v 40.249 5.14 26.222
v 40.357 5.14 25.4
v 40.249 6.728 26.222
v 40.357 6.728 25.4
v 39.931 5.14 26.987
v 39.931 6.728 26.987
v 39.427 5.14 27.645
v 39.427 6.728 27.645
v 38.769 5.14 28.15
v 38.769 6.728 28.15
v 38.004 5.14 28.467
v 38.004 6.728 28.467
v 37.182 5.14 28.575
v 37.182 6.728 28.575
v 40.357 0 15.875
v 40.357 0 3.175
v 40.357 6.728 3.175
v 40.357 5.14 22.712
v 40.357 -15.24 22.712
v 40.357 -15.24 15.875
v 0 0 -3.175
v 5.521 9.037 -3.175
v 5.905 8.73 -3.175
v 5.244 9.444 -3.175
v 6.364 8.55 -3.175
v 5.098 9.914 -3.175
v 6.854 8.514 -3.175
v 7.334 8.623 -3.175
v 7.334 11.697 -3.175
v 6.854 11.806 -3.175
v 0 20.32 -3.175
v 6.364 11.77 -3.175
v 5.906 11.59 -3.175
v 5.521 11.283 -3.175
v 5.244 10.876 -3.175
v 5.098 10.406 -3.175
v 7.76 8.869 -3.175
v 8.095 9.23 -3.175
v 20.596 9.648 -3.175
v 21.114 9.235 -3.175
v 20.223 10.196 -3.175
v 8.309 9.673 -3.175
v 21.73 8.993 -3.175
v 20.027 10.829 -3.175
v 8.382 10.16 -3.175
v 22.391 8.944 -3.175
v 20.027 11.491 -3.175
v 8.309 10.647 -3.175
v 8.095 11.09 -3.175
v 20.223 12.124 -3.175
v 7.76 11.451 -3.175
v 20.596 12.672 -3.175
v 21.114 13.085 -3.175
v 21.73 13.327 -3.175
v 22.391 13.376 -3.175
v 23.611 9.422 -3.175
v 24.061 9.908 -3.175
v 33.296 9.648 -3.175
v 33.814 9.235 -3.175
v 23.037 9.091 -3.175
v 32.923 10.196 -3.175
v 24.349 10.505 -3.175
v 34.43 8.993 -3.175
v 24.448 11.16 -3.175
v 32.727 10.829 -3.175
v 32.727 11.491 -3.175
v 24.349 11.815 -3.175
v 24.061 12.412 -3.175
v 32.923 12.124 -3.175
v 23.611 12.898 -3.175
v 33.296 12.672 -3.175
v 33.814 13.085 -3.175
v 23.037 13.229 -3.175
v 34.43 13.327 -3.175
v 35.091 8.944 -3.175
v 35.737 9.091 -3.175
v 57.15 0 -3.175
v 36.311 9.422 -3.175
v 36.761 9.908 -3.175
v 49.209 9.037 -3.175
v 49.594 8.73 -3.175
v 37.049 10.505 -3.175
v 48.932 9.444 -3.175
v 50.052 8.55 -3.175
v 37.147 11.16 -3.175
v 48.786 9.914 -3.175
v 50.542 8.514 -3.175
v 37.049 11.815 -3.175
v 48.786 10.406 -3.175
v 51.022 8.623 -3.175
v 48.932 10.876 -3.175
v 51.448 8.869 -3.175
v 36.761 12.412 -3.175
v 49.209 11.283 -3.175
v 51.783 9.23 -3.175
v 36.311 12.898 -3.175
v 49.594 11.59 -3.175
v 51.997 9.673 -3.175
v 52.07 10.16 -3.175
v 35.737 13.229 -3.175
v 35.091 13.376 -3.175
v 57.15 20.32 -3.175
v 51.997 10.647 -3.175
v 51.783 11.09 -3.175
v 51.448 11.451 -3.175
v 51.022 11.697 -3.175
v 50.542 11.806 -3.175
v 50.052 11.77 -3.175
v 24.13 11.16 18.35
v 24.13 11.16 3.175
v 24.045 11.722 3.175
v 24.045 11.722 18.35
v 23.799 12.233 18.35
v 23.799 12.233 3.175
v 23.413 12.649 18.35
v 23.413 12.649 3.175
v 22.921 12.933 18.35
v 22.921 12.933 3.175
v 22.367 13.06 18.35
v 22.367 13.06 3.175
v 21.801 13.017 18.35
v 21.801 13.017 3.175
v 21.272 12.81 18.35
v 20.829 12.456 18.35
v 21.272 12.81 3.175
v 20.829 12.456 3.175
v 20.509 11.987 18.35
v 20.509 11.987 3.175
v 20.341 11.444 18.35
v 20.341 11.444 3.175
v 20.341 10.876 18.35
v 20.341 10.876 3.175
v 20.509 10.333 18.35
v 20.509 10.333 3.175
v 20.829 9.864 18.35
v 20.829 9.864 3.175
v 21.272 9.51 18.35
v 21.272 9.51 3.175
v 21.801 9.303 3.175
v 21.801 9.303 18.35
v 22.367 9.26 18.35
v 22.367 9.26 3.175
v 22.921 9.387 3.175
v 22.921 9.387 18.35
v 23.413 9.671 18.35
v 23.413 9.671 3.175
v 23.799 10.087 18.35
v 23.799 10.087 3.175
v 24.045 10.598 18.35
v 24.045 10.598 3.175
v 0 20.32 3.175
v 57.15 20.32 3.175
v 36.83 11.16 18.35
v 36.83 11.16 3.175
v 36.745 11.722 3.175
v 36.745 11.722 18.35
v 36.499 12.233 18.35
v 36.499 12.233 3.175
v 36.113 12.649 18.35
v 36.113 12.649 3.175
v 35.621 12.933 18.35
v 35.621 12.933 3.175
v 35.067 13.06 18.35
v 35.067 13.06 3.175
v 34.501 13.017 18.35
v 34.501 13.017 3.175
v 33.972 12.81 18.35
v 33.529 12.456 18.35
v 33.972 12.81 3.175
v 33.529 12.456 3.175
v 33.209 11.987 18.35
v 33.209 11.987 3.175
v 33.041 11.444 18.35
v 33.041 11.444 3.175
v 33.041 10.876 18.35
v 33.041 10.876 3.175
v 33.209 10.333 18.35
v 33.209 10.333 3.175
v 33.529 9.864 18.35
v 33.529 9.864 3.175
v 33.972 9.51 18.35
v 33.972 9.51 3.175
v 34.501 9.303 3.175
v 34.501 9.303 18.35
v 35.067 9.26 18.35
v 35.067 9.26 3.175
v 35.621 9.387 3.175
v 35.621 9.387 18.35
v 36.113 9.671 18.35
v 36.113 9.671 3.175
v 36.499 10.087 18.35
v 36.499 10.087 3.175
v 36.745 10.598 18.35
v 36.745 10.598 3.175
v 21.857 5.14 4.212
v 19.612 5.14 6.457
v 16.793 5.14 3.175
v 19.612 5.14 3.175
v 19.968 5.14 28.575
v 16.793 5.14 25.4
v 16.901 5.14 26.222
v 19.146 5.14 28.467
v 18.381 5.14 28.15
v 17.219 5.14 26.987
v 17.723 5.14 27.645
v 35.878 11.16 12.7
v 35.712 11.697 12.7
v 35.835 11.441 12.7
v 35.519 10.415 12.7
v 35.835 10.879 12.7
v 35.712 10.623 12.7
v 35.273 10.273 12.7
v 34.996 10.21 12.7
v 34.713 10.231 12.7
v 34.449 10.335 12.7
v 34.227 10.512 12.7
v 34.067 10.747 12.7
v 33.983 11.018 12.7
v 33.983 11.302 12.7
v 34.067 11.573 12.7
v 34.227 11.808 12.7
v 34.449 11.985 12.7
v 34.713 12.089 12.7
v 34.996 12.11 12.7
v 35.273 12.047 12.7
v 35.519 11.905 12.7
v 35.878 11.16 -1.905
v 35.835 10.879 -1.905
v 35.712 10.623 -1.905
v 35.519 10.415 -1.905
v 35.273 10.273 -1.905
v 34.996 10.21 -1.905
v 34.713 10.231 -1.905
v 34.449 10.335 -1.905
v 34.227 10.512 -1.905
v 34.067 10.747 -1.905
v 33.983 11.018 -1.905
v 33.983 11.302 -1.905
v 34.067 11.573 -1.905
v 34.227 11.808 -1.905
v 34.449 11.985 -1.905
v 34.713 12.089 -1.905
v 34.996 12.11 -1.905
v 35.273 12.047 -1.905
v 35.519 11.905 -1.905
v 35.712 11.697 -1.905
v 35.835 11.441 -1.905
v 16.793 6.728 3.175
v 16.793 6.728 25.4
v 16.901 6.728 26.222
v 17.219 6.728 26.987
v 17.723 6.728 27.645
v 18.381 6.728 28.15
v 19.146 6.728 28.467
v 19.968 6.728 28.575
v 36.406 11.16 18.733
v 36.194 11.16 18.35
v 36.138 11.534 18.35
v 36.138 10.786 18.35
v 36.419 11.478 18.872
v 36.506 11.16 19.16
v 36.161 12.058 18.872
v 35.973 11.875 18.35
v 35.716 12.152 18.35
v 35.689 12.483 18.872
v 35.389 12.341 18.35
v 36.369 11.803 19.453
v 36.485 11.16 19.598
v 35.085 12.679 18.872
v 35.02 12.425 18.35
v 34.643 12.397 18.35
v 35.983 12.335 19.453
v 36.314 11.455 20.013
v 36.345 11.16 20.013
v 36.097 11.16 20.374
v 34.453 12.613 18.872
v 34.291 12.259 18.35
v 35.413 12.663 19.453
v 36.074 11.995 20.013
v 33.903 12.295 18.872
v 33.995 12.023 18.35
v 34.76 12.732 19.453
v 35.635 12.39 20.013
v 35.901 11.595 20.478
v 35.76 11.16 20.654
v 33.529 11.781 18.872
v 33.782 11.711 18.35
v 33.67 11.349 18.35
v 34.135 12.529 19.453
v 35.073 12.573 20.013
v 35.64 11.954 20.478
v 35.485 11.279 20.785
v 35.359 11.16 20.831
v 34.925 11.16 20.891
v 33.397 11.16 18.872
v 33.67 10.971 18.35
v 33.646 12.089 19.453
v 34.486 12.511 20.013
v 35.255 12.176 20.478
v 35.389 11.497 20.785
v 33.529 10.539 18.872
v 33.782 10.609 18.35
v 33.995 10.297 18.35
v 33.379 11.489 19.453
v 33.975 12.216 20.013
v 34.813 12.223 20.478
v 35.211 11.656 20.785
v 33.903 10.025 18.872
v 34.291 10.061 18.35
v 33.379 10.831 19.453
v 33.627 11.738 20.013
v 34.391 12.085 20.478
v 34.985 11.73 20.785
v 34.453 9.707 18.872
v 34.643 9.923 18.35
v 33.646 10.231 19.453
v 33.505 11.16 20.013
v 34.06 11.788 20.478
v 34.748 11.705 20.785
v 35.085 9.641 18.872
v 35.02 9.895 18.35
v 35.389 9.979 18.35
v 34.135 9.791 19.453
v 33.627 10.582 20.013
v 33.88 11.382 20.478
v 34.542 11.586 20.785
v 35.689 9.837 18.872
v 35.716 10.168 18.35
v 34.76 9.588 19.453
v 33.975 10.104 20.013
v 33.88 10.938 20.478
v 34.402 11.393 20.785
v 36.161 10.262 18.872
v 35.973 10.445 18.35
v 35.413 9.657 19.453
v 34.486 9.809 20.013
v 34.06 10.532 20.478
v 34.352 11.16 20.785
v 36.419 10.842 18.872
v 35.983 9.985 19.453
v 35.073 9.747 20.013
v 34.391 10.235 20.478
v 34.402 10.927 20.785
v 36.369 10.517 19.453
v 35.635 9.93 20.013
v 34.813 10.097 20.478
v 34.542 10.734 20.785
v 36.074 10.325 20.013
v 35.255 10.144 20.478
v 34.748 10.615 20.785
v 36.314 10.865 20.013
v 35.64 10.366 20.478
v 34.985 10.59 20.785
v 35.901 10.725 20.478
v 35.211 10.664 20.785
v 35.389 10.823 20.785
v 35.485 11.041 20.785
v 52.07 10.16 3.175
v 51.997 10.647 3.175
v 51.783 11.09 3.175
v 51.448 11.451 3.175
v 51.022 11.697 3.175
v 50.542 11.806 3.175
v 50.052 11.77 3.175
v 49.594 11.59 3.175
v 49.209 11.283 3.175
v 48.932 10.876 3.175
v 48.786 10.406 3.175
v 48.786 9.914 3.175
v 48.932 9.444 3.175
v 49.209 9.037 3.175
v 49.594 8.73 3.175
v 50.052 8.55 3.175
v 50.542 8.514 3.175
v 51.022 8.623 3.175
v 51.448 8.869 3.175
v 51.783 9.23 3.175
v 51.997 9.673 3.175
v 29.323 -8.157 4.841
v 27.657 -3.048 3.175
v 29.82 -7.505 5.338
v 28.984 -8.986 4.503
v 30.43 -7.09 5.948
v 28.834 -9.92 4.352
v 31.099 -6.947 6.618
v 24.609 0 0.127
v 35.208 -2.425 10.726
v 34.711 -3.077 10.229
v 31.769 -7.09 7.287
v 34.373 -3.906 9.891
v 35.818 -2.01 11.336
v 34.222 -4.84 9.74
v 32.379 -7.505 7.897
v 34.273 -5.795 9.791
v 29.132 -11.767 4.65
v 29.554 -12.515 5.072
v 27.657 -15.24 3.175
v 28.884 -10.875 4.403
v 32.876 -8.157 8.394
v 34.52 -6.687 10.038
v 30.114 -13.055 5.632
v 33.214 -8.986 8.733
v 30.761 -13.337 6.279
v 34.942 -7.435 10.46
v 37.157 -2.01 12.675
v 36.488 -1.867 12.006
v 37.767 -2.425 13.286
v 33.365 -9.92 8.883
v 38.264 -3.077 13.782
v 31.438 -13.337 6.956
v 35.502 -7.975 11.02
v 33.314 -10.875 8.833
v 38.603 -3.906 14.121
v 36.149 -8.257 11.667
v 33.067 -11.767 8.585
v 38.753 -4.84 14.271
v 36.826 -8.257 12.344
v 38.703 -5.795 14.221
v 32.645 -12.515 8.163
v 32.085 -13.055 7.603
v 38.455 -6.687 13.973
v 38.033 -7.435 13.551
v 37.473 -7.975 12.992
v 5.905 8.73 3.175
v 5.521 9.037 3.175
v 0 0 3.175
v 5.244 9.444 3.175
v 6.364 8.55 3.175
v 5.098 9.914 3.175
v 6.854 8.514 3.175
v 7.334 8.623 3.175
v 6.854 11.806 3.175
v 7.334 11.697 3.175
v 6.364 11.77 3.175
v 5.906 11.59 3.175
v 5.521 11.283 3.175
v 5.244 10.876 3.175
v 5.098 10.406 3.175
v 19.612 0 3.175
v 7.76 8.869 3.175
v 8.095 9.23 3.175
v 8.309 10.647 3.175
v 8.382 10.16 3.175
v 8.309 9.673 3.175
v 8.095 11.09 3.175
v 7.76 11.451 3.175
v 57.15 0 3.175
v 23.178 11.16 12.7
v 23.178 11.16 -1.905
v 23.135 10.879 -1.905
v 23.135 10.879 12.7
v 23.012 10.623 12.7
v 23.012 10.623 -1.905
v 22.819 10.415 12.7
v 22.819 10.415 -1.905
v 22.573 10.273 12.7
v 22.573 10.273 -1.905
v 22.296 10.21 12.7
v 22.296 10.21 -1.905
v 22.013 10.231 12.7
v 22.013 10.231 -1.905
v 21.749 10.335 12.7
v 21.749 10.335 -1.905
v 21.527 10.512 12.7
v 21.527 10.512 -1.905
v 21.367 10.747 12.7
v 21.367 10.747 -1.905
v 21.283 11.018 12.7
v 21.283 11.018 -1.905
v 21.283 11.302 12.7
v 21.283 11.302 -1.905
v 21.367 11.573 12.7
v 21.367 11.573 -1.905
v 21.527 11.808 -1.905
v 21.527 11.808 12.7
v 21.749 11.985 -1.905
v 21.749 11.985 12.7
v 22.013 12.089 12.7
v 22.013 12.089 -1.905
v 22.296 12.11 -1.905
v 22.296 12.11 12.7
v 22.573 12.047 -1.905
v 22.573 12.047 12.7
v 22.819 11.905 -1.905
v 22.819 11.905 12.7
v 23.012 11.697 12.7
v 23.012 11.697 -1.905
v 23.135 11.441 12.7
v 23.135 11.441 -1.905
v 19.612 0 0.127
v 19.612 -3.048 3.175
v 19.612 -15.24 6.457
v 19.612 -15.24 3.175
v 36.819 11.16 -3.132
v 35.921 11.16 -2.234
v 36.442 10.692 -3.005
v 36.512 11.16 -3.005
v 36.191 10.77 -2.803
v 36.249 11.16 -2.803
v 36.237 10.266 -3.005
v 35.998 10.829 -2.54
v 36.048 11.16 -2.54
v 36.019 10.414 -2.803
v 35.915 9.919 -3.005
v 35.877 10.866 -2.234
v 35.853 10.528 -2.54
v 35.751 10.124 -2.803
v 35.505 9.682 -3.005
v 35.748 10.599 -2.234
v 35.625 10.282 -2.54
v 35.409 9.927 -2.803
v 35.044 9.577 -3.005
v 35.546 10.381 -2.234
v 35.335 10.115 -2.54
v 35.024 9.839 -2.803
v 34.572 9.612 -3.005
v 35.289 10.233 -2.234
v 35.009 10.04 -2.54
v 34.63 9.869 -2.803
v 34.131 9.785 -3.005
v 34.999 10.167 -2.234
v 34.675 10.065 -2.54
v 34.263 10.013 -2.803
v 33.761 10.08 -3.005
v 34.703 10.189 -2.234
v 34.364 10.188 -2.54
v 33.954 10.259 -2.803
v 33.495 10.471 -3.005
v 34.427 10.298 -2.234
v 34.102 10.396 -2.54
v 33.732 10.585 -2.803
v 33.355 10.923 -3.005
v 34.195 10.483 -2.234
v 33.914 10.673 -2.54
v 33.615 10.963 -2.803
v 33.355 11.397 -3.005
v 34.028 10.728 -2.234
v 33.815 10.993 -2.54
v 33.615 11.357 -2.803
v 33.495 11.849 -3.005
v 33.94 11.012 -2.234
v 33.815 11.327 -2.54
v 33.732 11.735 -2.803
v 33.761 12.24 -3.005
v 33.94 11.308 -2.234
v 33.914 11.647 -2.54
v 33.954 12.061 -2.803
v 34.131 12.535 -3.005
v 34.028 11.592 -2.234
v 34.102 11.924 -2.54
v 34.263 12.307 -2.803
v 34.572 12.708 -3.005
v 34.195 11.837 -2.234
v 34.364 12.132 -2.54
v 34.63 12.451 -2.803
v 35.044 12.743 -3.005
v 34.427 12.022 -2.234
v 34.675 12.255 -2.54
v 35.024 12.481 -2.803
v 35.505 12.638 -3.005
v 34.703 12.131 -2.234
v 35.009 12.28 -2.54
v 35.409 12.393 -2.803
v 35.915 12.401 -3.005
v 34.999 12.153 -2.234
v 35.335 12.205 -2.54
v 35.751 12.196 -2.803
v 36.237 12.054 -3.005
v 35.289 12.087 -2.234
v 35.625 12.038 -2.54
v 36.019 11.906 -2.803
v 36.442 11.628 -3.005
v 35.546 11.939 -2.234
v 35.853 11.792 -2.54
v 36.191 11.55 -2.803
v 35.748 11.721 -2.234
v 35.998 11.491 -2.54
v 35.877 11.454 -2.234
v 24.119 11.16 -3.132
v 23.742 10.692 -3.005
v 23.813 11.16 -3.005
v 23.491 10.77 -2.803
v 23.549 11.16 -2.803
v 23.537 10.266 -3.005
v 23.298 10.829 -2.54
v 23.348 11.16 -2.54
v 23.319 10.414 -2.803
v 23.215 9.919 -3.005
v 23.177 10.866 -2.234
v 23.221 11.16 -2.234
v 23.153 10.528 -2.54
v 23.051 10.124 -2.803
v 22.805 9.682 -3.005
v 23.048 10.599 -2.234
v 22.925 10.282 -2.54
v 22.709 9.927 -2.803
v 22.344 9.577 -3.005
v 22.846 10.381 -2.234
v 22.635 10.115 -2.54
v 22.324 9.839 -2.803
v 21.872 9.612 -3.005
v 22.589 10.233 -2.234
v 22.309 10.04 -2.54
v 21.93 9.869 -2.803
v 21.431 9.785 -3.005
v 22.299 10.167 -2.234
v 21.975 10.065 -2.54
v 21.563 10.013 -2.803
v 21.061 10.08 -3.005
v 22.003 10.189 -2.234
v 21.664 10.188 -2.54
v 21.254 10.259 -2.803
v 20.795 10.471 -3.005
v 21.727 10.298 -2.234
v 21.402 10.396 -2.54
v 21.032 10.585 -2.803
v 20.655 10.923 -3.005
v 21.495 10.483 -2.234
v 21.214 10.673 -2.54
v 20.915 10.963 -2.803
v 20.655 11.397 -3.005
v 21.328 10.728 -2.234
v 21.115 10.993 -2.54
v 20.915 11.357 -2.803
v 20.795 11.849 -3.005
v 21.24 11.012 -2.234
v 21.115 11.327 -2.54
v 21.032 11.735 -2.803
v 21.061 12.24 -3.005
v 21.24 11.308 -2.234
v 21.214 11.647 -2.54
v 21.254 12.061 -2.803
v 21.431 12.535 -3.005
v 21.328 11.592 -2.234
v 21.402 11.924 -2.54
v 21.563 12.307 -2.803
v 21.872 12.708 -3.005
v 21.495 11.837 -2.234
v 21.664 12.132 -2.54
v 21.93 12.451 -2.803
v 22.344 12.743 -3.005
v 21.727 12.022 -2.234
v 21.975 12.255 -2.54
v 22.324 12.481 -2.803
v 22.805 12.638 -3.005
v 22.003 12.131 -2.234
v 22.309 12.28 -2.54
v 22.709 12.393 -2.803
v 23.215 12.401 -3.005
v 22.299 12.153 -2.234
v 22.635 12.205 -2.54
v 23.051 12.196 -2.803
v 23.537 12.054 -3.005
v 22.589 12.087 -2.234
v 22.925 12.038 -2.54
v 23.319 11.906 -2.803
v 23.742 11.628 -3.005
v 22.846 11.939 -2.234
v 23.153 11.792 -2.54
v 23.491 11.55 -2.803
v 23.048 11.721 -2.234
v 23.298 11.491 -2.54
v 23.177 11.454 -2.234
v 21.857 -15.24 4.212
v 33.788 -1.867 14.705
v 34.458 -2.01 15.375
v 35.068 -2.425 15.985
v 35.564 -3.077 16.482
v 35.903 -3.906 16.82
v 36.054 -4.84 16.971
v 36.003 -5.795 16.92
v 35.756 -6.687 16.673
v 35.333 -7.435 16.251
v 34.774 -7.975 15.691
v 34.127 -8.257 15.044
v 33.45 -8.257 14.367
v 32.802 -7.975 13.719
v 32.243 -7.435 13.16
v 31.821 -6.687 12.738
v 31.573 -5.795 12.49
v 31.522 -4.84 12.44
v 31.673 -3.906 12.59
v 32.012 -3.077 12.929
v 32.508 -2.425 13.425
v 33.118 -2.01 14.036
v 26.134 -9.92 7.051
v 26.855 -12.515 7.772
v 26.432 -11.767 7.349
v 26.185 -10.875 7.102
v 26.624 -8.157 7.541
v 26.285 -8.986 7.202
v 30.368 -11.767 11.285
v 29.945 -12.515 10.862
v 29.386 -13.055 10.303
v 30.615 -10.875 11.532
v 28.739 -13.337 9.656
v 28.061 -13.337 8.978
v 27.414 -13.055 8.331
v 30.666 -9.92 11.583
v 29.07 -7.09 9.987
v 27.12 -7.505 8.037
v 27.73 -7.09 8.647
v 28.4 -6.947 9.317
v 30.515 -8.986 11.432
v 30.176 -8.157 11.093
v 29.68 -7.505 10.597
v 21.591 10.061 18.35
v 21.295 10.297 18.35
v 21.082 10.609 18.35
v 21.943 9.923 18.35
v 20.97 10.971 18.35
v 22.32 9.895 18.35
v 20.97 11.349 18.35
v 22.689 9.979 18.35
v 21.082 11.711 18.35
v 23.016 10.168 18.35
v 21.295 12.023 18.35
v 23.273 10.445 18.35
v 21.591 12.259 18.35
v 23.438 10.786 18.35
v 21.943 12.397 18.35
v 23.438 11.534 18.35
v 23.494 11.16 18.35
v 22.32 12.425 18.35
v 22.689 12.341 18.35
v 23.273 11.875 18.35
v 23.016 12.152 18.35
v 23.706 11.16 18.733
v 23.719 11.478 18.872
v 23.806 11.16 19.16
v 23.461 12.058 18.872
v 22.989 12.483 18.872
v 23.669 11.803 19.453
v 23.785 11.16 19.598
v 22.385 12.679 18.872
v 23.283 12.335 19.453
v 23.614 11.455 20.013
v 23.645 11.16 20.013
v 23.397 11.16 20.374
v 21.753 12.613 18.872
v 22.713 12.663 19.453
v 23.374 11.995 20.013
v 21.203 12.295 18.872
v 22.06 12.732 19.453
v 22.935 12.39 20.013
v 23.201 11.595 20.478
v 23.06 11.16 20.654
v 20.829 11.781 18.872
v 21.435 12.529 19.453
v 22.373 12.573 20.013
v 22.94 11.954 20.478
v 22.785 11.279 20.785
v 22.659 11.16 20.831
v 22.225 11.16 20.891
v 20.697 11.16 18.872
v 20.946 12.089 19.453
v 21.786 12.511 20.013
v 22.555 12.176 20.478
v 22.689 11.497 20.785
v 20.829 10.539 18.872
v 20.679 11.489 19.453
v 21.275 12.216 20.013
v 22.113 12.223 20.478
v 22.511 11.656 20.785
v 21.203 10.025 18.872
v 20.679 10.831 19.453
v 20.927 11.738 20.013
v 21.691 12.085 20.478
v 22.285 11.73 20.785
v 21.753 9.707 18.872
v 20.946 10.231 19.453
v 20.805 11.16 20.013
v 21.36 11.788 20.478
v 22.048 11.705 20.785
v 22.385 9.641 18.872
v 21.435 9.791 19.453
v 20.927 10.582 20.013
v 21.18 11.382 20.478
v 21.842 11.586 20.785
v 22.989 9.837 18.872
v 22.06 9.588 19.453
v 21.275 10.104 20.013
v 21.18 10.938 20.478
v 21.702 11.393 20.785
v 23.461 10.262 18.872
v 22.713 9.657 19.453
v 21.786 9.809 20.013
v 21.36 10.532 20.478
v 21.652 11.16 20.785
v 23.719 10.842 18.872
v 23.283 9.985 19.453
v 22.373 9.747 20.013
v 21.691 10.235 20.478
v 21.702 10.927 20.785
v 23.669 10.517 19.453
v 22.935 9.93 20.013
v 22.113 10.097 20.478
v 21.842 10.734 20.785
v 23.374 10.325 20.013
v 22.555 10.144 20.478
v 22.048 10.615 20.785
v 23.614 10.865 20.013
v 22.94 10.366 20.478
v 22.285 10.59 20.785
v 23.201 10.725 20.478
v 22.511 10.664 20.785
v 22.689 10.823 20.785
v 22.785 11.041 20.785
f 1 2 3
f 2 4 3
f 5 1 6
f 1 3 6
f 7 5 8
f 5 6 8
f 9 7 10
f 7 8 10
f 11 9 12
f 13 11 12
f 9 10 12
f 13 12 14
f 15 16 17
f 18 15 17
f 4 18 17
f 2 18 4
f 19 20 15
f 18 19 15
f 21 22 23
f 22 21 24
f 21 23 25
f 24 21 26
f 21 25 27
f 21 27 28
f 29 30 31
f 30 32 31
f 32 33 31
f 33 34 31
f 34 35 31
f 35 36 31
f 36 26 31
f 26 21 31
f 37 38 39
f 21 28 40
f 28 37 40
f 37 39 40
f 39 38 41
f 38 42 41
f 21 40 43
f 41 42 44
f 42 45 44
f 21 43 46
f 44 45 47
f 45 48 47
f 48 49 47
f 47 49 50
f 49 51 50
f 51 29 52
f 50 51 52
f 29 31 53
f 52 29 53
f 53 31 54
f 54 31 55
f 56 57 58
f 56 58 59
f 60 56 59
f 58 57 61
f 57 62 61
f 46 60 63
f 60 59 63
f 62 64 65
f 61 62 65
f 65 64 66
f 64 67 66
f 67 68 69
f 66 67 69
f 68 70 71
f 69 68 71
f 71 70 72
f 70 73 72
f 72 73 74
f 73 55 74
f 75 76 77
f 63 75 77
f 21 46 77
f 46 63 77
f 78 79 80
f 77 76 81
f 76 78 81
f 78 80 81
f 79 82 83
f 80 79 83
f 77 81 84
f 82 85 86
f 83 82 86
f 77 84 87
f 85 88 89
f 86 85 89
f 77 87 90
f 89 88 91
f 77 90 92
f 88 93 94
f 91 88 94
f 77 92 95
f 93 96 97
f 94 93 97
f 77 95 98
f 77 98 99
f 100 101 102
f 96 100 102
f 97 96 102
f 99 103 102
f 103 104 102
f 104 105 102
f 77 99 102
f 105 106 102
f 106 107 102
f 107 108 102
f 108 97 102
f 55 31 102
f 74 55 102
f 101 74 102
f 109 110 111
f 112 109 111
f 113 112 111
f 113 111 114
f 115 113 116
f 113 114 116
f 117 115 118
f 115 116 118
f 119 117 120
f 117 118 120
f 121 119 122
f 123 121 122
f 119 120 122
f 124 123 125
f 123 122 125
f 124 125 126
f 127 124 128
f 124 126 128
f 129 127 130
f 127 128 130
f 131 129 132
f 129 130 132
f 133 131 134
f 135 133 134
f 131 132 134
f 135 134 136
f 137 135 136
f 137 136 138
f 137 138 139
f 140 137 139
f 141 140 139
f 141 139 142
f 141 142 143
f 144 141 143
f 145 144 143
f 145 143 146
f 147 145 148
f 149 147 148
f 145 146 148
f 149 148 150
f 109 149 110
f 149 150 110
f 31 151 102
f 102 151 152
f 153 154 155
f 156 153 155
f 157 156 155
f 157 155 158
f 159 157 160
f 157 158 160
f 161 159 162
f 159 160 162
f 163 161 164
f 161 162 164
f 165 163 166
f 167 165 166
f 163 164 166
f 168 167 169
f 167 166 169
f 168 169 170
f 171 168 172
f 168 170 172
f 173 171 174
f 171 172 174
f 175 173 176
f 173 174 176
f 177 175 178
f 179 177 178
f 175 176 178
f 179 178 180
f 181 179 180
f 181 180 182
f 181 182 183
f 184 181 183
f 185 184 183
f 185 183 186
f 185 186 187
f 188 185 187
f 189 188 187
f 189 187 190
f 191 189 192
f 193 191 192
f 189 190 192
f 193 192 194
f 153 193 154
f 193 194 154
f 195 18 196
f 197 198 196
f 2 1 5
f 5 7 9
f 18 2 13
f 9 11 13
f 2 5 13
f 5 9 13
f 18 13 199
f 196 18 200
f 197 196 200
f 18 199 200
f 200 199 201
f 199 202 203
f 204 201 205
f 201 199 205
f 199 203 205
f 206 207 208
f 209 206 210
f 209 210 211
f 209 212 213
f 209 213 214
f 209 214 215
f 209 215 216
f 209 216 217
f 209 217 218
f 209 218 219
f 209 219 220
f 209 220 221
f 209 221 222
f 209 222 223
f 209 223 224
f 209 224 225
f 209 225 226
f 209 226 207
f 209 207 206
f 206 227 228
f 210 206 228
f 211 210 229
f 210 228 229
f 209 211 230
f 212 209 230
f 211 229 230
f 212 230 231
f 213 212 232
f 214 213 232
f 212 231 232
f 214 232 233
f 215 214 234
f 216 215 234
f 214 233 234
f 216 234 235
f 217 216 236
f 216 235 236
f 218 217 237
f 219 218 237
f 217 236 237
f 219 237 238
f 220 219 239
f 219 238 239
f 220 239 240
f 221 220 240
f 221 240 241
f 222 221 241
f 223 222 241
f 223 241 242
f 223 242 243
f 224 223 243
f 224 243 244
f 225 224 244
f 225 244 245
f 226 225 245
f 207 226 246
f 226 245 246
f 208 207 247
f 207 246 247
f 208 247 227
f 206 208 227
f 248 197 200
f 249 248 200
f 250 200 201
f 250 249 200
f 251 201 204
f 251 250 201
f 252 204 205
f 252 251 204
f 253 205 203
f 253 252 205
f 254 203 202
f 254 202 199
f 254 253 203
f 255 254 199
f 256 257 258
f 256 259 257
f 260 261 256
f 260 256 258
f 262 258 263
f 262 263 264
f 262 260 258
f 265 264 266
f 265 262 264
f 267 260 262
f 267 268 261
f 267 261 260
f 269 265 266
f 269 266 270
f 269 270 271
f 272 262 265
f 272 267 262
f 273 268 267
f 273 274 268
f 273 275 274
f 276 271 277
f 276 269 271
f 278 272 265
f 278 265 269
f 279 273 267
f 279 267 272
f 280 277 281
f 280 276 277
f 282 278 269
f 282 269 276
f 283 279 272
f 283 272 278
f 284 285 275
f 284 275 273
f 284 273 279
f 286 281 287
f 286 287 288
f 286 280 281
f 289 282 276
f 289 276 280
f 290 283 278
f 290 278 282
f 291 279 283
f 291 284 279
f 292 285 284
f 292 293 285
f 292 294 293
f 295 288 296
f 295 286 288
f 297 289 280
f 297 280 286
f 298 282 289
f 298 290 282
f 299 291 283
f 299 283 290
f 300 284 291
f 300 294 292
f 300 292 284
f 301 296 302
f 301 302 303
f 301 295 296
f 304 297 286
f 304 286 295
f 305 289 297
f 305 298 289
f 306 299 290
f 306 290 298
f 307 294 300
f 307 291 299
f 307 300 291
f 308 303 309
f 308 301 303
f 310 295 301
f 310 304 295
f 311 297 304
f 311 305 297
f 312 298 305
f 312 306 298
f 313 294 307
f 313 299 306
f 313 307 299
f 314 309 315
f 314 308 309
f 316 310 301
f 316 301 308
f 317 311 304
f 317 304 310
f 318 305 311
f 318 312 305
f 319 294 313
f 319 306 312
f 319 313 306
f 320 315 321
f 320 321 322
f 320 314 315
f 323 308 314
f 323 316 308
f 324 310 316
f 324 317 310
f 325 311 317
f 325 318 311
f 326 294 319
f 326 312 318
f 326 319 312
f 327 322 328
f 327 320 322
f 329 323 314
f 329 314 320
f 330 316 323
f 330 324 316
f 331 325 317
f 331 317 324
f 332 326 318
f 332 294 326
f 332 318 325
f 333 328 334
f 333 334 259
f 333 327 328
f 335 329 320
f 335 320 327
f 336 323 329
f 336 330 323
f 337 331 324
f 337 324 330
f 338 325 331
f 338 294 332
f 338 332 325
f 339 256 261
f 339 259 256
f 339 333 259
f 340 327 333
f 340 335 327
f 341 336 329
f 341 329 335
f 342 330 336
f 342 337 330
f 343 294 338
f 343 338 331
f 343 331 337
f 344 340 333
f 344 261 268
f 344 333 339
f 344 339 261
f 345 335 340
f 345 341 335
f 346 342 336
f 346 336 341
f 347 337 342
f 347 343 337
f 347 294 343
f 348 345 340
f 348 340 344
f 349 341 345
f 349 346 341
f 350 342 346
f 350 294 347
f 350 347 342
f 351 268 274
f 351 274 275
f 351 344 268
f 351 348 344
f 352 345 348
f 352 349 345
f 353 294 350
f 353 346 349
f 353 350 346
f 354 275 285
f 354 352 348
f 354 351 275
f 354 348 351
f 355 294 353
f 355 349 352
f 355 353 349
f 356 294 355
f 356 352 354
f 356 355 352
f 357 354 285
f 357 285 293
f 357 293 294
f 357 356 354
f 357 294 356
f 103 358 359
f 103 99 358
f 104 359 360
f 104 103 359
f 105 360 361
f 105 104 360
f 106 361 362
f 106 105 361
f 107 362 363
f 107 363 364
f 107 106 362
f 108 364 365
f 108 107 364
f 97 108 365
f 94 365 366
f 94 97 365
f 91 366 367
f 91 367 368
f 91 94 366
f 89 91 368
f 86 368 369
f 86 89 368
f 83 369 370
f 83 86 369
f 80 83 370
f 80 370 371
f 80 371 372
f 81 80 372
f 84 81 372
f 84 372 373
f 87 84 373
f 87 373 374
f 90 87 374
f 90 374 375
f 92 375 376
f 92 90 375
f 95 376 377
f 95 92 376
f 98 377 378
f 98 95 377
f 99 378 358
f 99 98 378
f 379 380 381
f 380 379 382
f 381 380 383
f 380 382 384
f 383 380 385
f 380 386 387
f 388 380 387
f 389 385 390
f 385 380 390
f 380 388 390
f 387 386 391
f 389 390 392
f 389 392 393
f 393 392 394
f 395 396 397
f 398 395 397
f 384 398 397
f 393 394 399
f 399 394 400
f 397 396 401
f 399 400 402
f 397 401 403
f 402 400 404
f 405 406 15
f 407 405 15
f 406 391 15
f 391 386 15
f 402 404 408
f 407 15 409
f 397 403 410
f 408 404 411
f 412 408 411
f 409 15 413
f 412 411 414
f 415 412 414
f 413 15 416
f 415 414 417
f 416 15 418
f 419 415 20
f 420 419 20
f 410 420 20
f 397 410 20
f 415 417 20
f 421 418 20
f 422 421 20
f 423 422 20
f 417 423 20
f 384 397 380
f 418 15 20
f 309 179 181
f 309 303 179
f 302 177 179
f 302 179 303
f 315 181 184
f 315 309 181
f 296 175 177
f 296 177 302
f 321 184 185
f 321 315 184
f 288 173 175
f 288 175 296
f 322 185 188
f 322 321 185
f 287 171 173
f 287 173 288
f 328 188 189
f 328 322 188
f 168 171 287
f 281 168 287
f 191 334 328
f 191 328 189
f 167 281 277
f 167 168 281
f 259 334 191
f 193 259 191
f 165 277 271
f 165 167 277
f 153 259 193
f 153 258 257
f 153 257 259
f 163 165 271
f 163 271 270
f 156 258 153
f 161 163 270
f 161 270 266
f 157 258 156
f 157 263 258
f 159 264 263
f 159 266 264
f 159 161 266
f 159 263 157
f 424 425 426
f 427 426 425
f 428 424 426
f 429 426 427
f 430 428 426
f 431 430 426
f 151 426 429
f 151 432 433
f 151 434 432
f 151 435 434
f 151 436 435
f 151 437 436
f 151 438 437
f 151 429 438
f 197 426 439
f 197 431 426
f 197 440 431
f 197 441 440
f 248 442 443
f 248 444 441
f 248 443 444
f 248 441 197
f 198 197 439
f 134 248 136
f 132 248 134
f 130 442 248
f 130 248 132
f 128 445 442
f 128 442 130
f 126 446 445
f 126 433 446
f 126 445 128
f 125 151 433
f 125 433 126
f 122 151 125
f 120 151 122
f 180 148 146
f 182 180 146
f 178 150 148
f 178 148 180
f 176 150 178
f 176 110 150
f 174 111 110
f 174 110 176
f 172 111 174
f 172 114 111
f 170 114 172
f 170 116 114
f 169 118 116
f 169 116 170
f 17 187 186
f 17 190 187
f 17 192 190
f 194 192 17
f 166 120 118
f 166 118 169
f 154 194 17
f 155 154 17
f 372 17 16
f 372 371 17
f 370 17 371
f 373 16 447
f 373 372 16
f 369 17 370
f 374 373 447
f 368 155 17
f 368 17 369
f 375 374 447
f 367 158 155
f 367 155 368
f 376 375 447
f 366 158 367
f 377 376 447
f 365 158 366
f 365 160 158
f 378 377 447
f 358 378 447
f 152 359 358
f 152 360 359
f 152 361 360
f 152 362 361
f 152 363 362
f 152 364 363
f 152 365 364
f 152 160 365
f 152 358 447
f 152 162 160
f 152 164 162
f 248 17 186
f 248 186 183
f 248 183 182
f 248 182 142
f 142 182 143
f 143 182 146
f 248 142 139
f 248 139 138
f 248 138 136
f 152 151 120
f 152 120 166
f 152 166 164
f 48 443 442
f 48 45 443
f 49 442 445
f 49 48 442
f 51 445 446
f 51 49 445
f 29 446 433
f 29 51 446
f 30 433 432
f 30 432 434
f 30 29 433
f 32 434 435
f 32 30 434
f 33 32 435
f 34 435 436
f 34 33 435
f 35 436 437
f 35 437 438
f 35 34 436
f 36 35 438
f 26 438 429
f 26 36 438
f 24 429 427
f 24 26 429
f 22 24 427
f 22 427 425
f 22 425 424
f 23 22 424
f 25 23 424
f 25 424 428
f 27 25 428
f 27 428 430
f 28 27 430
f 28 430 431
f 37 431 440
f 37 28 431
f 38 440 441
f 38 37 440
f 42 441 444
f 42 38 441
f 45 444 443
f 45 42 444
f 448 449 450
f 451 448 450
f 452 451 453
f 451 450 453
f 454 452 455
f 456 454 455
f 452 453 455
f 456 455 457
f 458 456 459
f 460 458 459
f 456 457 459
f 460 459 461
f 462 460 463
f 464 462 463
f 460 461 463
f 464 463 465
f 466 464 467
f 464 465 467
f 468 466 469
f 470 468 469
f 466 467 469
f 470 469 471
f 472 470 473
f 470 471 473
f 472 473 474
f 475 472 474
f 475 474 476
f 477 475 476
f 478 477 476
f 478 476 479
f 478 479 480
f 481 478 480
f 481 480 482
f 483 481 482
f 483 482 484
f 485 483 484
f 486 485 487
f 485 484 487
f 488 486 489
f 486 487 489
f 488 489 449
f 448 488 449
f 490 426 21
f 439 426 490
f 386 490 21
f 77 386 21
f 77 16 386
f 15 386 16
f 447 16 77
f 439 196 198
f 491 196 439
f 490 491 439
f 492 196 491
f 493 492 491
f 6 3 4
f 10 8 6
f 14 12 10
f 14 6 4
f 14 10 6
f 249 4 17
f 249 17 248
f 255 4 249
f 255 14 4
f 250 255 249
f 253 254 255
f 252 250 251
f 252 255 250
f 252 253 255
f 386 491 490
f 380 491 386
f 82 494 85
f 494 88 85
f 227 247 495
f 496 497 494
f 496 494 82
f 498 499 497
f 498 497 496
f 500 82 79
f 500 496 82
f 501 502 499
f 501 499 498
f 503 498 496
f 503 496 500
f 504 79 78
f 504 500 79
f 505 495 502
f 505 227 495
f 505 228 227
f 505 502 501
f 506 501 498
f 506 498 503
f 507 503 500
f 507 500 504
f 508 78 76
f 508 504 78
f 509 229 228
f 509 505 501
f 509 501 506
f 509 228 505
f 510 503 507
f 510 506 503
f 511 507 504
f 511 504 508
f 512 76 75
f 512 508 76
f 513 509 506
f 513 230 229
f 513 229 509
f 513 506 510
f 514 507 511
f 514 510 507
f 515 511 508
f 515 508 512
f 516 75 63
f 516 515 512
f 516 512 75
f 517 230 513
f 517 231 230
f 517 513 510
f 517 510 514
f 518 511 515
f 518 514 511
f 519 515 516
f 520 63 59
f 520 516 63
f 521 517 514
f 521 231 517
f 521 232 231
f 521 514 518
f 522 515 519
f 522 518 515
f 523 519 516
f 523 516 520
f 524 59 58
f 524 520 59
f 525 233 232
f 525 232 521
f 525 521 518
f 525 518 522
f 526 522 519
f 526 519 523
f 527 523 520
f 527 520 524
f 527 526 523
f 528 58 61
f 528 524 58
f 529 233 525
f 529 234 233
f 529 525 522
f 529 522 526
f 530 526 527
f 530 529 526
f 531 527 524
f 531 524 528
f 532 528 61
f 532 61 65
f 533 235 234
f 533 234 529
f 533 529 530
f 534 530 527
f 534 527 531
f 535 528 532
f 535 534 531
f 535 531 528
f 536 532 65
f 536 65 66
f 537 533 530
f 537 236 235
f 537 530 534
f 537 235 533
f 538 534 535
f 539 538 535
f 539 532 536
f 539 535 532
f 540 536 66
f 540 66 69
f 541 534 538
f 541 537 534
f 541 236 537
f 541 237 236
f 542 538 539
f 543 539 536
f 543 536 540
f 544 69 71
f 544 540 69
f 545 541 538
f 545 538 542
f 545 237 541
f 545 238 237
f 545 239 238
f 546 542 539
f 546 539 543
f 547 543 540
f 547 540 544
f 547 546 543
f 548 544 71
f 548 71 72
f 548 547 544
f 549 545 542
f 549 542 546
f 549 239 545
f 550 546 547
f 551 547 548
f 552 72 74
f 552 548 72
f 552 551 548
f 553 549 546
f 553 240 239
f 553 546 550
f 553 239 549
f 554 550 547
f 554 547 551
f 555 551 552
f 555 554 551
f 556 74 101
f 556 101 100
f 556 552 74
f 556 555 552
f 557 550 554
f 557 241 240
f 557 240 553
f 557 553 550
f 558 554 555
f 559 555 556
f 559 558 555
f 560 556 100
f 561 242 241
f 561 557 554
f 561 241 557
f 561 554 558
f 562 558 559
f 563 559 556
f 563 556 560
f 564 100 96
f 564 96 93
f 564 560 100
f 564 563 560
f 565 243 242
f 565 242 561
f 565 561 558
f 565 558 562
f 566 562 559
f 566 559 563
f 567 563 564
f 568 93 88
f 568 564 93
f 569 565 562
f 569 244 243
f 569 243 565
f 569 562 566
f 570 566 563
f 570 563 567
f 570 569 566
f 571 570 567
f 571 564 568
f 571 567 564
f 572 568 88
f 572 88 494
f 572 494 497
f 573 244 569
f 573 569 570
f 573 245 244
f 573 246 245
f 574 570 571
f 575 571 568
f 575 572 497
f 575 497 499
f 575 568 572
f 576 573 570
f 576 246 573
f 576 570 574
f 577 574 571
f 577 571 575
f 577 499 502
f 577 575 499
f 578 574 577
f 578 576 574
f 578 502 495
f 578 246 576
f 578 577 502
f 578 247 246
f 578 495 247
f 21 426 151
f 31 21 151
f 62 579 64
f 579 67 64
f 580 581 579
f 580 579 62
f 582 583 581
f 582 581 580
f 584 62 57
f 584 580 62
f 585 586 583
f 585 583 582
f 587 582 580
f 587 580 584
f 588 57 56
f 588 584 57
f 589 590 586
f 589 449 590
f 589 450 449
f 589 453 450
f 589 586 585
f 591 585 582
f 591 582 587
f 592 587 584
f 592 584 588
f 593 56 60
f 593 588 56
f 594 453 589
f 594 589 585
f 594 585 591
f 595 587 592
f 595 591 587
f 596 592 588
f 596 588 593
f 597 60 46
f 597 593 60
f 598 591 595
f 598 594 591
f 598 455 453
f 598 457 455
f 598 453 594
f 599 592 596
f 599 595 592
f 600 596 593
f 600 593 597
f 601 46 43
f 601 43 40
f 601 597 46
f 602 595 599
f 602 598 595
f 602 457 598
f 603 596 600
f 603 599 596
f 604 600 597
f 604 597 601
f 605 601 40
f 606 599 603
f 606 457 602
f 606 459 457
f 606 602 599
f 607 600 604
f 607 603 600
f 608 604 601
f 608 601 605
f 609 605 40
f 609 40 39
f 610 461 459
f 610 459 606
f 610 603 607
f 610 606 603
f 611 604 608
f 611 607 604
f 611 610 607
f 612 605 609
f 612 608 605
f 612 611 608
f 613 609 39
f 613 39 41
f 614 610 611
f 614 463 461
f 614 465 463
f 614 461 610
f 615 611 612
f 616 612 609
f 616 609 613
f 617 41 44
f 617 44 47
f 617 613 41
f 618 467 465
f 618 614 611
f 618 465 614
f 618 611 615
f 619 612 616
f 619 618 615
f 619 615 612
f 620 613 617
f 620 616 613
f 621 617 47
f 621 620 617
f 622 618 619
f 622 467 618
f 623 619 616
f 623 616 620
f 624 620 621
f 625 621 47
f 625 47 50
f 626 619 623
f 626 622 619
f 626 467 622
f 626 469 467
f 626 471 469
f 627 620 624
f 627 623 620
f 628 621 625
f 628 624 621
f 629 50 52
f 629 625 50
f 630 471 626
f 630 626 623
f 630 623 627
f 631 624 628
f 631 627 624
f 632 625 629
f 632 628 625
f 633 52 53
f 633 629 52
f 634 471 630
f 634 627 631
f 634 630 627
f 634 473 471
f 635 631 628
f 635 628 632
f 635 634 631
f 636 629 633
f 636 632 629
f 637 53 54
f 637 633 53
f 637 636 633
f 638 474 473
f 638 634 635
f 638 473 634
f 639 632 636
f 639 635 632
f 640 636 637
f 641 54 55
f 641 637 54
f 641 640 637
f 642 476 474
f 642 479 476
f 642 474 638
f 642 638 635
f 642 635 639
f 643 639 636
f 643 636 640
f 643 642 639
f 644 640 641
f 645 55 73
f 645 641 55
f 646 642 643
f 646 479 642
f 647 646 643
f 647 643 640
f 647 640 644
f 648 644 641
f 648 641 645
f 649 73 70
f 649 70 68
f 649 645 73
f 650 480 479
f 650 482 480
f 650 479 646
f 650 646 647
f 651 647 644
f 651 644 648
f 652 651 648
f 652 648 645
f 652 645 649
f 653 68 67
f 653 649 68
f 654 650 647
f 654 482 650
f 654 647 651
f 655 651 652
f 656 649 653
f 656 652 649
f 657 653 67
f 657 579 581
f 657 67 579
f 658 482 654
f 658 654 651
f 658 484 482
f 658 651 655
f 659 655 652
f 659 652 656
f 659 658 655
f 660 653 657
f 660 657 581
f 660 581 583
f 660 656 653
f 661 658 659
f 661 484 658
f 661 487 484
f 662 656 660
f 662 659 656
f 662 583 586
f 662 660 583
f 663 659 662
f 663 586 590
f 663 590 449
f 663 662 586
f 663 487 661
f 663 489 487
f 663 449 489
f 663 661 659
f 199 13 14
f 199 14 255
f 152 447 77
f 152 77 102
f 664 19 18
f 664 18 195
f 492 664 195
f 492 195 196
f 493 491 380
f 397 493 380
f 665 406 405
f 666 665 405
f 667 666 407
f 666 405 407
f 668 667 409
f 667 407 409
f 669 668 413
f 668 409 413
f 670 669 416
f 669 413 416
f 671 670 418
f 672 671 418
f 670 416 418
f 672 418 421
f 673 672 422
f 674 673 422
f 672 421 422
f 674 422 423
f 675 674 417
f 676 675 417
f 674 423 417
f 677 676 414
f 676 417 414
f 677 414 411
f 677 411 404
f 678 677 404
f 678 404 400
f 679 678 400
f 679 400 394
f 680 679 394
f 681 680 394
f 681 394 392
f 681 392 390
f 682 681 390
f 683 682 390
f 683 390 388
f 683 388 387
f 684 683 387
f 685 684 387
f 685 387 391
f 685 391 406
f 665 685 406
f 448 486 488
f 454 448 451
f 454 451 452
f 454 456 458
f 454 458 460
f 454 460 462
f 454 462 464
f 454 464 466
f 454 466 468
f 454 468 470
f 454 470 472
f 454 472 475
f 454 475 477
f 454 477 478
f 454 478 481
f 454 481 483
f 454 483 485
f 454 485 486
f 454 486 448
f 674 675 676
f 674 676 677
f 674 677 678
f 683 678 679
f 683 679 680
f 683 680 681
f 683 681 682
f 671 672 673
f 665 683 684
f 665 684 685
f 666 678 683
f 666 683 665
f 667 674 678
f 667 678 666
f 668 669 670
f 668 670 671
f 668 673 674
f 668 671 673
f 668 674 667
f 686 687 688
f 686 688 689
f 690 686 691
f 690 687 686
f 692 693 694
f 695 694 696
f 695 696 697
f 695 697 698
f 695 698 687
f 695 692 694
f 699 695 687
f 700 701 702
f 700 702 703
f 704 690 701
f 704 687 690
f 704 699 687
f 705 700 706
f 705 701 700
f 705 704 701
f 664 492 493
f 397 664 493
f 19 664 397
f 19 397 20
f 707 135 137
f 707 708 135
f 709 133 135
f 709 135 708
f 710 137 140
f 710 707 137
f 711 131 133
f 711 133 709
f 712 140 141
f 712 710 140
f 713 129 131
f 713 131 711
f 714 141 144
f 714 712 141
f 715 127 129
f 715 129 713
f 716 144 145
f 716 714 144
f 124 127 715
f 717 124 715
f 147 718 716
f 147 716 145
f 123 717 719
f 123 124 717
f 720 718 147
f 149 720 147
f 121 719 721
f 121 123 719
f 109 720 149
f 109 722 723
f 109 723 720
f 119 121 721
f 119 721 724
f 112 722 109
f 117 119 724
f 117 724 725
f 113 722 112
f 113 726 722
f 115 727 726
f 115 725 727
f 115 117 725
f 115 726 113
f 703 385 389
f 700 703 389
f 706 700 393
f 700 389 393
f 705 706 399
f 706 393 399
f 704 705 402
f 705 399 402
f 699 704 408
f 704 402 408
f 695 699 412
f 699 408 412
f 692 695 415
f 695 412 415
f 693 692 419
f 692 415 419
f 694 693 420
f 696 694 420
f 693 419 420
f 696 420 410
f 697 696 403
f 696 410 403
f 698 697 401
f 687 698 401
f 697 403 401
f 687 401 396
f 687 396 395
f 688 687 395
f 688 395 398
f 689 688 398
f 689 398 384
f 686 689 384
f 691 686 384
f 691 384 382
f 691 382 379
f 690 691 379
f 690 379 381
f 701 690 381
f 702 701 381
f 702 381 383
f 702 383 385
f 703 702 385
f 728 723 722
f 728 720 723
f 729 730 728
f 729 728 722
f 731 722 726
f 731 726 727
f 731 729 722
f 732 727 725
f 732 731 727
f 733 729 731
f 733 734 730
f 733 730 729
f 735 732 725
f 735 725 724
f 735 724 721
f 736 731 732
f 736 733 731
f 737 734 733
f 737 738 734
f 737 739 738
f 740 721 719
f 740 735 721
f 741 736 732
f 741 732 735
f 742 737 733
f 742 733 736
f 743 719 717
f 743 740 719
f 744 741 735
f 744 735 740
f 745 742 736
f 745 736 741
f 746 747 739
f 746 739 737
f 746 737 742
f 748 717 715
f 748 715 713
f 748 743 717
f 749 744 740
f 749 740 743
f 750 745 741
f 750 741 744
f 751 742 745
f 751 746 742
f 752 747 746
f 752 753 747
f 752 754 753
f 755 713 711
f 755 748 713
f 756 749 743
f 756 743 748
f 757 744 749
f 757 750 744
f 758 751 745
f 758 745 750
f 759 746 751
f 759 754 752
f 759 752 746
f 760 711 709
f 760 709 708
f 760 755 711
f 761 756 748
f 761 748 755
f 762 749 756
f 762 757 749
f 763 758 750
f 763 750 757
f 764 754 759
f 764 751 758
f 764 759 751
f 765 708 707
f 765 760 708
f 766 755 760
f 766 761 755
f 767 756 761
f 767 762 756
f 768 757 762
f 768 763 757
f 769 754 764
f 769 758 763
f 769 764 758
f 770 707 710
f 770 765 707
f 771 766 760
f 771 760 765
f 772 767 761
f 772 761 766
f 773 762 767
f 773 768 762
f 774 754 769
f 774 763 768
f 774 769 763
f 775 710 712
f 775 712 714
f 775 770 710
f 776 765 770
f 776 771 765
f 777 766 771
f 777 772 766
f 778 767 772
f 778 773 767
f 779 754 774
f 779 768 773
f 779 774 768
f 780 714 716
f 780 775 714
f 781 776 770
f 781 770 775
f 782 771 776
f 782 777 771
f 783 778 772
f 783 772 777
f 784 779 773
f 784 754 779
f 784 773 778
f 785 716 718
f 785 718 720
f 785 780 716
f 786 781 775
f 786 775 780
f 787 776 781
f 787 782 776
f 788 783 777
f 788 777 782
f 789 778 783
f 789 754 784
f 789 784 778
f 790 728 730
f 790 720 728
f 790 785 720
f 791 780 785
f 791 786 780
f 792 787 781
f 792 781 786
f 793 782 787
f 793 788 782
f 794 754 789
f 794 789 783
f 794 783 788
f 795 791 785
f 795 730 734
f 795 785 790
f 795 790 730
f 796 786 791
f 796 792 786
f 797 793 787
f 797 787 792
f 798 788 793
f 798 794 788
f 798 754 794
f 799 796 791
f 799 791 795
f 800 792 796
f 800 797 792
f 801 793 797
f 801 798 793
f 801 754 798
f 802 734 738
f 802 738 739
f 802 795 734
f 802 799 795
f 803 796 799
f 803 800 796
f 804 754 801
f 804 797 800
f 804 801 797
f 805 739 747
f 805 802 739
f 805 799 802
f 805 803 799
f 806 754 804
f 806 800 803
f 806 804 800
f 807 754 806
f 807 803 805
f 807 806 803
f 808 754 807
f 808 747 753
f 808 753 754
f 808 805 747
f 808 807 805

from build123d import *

# Parameters (mm, degrees)
SKETCH_W          = 57.15
SKETCH_H          = 20.32
SKETCH_R          = 1.651
PAD_DEPTH         = 3.175
SKETCH001_R       = 1.905
PAD001_DEPTH      = 15.175
SKETCH002_R       = 0.9525
POCKET_DEPTH      = 15.875
PAD002_DEPTH      = 15.24
PAD002_DEPTH_BACK = 5.1402
FILLET_R          = 1.27
CHAMFER_SIZE      = 12.7
CHAMFER001_SIZE   = 3.048
SKETCH004_R       = 3.2131
POCKET001_DEPTH   = 3.81762
SKETCH005_W       = 23.563626
SKETCH005_H       = 25.4
PAD003_DEPTH      = 1.5875
FILLET001_R       = 3.175


with BuildPart() as ball1:
    # Sphere → Sphere (revolve)
    with BuildSketch(Plane(origin=(34.925, 11.16, 19.304), x_dir=(1, 0, 0), z_dir=(0, -1, 0))):
        with BuildLine():
            ThreePointArc((0, -1.5875), (1.5875, 0), (0, 1.5875))
            Line((0, 1.5875), (0, -1.5875))
        make_face()
    revolve(axis=Axis((34.925, 11.16, 19.304), (0, 0, 1)))


with BuildPart() as ball002:
    # Sphere001 → Sphere001 (revolve)
    with BuildSketch(Plane(origin=(22.225, 11.16, 19.304), x_dir=(1, 0, 0), z_dir=(0, -1, 0))):
        with BuildLine():
            ThreePointArc((0, -1.5875), (1.5875, 0), (0, 1.5875))
            Line((0, 1.5875), (0, -1.5875))
        make_face()
    revolve(axis=Axis((22.225, 11.16, 19.304), (0, 0, 1)))


with BuildPart() as fusion:
    # Sketch → Pad (new body, symmetric)
    with BuildSketch(Plane.XY):
        with Locations((28.575, 10.16)):
            Rectangle(SKETCH_W, SKETCH_H)
        with Locations((6.731, 10.16)):
            Circle(SKETCH_R, mode=Mode.SUBTRACT)
        with Locations((50.419, 10.16)):
            Circle(SKETCH_R, mode=Mode.SUBTRACT)
    extrude(amount=PAD_DEPTH, both=True)

    # Sketch001 (on Face8 of Pad) → Pad001 (join)
    with BuildSketch(Plane.XY.offset(3.175)):
        with Locations((22.225, 11.16)):
            Circle(SKETCH001_R)
        with Locations((34.925, 11.16)):
            Circle(SKETCH001_R)
    extrude(amount=PAD001_DEPTH)

    # Sketch002 (on Face4 of Pad001) → Pocket (cut)
    with BuildSketch(Plane(origin=(0, 0, -3.175), x_dir=(1, 0, 0), z_dir=(0, 0, -1))):
        with Locations((22.225, -11.16)):
            Circle(SKETCH002_R)
        with Locations((34.925, -11.16)):
            Circle(SKETCH002_R)
    extrude(amount=-POCKET_DEPTH, mode=Mode.SUBTRACT)

    # Sketch003 (on Face6 of Pocket) → Pad002 (join, two sides)
    with BuildSketch(Plane.XZ) as pad002_sk:
        Polygon((40.356813, 3.175), (40.356813, 22.711586), (21.857486, 4.212258), (19.612422, 6.457322), (19.612422, 3.175), align=None)
    extrude(amount=PAD002_DEPTH)
    extrude(pad002_sk.sketch, amount=-PAD002_DEPTH_BACK)

    # Fillet
    fillet_edges = [fusion.edges().sort_by_distance(p)[0] for p in [
        (33.9725, 11.16, -3.175),
        (21.2725, 11.16, -3.175),
    ]]
    fillet(fillet_edges, radius=FILLET_R)

    # Chamfer
    chamfer_edges = [fusion.edges().sort_by_distance(p)[0] for p in [
        (40.356813, -7.62, 3.175),
    ]]
    chamfer(chamfer_edges, length=CHAMFER_SIZE)

    # Chamfer001
    chamfer001_edges = [fusion.edges().sort_by_distance(p)[0] for p in [
        (23.634617, 0, 3.175),
    ]]
    chamfer(chamfer001_edges, length=CHAMFER001_SIZE)

    # Sketch004 (on Face2 of Chamfer001) → Pocket001 (cut)
    with BuildSketch(Plane(origin=(12.240907, 0, -12.240907), x_dir=(0, 1, 0), z_dir=(0.707107, 0, -0.707107))):
        with Locations((-10.16, 26.67)):
            Circle(SKETCH004_R)
        with Locations((-5.08, 34.29)):
            Circle(SKETCH004_R)
    extrude(amount=-POCKET001_DEPTH, mode=Mode.SUBTRACT)

    # Sketch005 (on Face15 of Pocket001) → Pad003 (join)
    with BuildSketch(Plane(origin=(0, 5.1402, 0), x_dir=(-1, 0, 0), z_dir=(0, 1, 0))):
        with Locations((-28.575, 15.875)):
            Rectangle(SKETCH005_W, SKETCH005_H)
    extrude(amount=PAD003_DEPTH)

    # Fillet001
    fillet001_edges = [fusion.edges().sort_by_distance(p)[0] for p in [
        (40.356813, 5.93395, 28.575),
        (16.793187, 5.93395, 28.575),
    ]]
    fillet(fillet001_edges, radius=FILLET001_R)

    # Fusion: union Ball1, Ball002
    add(ball1.part)
    add(ball002.part)


solid = fusion.part
